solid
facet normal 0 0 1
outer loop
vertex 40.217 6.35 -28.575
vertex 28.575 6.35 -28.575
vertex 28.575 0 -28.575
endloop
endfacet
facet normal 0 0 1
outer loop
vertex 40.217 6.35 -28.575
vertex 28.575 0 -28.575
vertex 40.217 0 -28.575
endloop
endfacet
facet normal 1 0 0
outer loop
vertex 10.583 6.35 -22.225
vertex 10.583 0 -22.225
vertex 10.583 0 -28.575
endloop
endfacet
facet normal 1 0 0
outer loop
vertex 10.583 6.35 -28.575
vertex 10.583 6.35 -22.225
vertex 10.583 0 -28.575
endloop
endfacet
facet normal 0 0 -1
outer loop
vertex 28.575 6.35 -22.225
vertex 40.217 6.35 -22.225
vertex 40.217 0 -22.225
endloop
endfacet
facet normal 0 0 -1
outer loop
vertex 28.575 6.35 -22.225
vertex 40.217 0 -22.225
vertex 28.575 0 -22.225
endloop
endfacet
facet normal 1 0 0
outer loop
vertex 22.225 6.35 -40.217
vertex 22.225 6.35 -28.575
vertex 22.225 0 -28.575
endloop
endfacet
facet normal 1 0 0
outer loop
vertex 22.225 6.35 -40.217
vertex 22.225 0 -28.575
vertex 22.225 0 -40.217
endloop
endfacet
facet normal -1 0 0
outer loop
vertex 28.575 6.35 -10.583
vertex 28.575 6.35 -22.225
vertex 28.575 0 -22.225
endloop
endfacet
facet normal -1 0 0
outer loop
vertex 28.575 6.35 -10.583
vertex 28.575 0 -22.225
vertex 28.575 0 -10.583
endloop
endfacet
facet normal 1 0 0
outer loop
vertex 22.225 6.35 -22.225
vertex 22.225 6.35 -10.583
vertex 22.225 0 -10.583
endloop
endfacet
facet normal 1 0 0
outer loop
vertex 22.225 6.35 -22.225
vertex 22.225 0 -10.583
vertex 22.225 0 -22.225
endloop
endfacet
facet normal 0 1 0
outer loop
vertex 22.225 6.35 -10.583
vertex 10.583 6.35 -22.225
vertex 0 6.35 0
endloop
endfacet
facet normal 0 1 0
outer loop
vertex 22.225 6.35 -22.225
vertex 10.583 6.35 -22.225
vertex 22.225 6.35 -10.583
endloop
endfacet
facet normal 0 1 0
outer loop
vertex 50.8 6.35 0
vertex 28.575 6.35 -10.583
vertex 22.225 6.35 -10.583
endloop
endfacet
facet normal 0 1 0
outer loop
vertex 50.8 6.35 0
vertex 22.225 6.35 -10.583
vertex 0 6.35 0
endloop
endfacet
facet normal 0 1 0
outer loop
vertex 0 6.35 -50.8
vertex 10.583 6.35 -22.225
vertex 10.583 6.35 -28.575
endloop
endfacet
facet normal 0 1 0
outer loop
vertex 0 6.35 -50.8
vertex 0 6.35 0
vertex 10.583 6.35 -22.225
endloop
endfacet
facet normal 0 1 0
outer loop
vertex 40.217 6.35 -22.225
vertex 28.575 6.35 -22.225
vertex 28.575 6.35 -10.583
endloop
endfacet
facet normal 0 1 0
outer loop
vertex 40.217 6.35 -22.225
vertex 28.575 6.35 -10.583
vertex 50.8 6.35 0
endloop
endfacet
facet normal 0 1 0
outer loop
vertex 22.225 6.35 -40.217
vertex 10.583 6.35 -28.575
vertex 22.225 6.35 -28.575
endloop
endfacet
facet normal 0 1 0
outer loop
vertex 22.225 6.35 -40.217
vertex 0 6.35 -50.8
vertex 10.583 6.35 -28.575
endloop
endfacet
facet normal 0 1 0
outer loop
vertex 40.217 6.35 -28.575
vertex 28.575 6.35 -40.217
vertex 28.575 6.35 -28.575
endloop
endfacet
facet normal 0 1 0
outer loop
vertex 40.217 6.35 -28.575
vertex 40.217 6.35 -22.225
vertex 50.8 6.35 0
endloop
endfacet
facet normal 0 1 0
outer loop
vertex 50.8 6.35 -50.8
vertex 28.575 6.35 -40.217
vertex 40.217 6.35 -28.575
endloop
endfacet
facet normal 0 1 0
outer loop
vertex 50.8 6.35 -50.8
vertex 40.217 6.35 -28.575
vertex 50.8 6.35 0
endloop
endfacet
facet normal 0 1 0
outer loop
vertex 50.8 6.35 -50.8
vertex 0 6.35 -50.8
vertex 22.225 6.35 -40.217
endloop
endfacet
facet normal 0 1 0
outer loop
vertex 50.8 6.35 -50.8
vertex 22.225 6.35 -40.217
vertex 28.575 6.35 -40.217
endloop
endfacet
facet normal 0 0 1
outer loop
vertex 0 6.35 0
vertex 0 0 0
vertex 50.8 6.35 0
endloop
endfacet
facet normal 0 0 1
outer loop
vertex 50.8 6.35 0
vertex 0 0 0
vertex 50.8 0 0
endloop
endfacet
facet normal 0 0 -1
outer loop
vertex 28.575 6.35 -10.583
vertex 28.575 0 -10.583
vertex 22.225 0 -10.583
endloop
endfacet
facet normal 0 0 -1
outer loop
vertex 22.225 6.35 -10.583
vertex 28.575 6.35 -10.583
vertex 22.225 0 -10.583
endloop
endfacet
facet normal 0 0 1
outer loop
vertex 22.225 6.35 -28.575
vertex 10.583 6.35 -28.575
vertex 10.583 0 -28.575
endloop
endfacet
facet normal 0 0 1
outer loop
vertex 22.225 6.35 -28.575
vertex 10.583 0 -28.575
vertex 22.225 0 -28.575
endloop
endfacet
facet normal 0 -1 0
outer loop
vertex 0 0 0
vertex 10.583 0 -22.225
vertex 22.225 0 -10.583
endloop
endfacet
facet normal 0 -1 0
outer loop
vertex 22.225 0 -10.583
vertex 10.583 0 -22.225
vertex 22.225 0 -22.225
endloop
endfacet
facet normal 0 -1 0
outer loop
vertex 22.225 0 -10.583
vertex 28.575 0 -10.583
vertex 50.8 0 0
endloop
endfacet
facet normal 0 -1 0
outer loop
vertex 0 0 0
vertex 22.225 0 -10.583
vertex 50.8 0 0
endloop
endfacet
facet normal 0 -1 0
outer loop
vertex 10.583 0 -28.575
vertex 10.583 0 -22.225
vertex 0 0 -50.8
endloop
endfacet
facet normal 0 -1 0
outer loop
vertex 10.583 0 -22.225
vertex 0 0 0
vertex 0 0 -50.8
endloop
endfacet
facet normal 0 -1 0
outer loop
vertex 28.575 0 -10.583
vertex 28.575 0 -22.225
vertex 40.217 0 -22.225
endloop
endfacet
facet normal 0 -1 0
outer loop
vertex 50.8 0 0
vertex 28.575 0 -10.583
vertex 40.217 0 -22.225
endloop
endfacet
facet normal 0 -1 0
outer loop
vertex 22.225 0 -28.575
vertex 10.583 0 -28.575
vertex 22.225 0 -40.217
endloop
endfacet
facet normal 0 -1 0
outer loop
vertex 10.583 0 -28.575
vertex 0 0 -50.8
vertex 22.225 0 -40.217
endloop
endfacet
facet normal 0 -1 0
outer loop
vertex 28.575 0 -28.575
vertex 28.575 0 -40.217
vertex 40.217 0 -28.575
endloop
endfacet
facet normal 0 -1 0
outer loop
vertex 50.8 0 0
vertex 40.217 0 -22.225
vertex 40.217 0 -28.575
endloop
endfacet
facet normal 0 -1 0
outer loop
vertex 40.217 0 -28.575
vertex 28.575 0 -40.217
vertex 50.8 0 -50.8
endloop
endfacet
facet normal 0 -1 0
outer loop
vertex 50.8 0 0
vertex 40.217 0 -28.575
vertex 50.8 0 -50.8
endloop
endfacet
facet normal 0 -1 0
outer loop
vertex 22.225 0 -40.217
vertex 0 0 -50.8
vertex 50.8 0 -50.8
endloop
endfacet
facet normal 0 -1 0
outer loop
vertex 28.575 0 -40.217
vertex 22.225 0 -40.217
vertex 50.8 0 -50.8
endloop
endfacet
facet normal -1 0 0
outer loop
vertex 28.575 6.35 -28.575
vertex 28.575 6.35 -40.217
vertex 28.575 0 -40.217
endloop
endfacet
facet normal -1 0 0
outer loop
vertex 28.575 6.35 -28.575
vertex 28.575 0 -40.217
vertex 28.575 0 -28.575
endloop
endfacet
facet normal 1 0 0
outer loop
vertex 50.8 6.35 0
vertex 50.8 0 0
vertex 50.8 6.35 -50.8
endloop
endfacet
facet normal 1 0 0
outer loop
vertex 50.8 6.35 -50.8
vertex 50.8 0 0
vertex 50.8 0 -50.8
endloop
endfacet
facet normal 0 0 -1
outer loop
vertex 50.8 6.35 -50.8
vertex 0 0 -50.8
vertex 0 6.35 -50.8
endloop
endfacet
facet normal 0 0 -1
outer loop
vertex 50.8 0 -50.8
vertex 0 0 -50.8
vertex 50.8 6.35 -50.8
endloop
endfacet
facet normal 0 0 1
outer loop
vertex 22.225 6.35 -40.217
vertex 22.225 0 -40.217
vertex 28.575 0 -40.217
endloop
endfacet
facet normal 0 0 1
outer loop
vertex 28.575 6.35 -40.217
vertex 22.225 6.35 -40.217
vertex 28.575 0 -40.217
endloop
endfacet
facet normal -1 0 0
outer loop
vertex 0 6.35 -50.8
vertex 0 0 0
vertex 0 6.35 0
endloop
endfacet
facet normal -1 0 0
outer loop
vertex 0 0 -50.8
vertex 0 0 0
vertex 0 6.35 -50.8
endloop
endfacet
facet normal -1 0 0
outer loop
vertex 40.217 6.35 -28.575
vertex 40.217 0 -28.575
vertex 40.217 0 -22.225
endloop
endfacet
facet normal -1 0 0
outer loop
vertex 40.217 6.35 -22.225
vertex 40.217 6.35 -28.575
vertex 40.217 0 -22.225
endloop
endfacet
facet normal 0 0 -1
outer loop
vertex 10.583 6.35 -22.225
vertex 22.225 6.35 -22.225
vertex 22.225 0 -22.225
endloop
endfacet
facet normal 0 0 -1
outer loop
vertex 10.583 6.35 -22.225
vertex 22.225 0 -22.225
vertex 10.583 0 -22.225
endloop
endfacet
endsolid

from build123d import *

# Parameters (mm, degrees)
SKETCH1_W           = 50.8
SKETCH1_H           = 50.8
BOSS_EXTRUDE1_DEPTH = 6.35
CUT_EXTRUDE1_DEPTH  = 6.35


with BuildPart() as part:
    # Sketch1 → Boss-Extrude1 (new body)
    with BuildSketch(Plane(origin=(0, 0, 0), x_dir=(1, 0, 0), z_dir=(0, 1, 0))):
        with Locations((25.4, 25.4)):
            Rectangle(SKETCH1_W, SKETCH1_H)
    extrude(amount=BOSS_EXTRUDE1_DEPTH)

    # Sketch2 → Cut-Extrude1 (cut)
    with BuildSketch(Plane(origin=(0, 6.35, 0), x_dir=(1, 0, 0), z_dir=(0, 1, 0))):
        Polygon((28.575, 28.575), (40.216666667, 28.575), (40.216666667, 22.225), (28.575, 22.225), (28.575, 10.583333333), (22.225, 10.583333333), (22.225, 22.225), (10.583333333, 22.225), (10.583333333, 28.575), (22.225, 28.575), (22.225, 40.216666667), (28.575, 40.216666667), align=None)
    extrude(amount=-CUT_EXTRUDE1_DEPTH, mode=Mode.SUBTRACT)


solid = part.part
